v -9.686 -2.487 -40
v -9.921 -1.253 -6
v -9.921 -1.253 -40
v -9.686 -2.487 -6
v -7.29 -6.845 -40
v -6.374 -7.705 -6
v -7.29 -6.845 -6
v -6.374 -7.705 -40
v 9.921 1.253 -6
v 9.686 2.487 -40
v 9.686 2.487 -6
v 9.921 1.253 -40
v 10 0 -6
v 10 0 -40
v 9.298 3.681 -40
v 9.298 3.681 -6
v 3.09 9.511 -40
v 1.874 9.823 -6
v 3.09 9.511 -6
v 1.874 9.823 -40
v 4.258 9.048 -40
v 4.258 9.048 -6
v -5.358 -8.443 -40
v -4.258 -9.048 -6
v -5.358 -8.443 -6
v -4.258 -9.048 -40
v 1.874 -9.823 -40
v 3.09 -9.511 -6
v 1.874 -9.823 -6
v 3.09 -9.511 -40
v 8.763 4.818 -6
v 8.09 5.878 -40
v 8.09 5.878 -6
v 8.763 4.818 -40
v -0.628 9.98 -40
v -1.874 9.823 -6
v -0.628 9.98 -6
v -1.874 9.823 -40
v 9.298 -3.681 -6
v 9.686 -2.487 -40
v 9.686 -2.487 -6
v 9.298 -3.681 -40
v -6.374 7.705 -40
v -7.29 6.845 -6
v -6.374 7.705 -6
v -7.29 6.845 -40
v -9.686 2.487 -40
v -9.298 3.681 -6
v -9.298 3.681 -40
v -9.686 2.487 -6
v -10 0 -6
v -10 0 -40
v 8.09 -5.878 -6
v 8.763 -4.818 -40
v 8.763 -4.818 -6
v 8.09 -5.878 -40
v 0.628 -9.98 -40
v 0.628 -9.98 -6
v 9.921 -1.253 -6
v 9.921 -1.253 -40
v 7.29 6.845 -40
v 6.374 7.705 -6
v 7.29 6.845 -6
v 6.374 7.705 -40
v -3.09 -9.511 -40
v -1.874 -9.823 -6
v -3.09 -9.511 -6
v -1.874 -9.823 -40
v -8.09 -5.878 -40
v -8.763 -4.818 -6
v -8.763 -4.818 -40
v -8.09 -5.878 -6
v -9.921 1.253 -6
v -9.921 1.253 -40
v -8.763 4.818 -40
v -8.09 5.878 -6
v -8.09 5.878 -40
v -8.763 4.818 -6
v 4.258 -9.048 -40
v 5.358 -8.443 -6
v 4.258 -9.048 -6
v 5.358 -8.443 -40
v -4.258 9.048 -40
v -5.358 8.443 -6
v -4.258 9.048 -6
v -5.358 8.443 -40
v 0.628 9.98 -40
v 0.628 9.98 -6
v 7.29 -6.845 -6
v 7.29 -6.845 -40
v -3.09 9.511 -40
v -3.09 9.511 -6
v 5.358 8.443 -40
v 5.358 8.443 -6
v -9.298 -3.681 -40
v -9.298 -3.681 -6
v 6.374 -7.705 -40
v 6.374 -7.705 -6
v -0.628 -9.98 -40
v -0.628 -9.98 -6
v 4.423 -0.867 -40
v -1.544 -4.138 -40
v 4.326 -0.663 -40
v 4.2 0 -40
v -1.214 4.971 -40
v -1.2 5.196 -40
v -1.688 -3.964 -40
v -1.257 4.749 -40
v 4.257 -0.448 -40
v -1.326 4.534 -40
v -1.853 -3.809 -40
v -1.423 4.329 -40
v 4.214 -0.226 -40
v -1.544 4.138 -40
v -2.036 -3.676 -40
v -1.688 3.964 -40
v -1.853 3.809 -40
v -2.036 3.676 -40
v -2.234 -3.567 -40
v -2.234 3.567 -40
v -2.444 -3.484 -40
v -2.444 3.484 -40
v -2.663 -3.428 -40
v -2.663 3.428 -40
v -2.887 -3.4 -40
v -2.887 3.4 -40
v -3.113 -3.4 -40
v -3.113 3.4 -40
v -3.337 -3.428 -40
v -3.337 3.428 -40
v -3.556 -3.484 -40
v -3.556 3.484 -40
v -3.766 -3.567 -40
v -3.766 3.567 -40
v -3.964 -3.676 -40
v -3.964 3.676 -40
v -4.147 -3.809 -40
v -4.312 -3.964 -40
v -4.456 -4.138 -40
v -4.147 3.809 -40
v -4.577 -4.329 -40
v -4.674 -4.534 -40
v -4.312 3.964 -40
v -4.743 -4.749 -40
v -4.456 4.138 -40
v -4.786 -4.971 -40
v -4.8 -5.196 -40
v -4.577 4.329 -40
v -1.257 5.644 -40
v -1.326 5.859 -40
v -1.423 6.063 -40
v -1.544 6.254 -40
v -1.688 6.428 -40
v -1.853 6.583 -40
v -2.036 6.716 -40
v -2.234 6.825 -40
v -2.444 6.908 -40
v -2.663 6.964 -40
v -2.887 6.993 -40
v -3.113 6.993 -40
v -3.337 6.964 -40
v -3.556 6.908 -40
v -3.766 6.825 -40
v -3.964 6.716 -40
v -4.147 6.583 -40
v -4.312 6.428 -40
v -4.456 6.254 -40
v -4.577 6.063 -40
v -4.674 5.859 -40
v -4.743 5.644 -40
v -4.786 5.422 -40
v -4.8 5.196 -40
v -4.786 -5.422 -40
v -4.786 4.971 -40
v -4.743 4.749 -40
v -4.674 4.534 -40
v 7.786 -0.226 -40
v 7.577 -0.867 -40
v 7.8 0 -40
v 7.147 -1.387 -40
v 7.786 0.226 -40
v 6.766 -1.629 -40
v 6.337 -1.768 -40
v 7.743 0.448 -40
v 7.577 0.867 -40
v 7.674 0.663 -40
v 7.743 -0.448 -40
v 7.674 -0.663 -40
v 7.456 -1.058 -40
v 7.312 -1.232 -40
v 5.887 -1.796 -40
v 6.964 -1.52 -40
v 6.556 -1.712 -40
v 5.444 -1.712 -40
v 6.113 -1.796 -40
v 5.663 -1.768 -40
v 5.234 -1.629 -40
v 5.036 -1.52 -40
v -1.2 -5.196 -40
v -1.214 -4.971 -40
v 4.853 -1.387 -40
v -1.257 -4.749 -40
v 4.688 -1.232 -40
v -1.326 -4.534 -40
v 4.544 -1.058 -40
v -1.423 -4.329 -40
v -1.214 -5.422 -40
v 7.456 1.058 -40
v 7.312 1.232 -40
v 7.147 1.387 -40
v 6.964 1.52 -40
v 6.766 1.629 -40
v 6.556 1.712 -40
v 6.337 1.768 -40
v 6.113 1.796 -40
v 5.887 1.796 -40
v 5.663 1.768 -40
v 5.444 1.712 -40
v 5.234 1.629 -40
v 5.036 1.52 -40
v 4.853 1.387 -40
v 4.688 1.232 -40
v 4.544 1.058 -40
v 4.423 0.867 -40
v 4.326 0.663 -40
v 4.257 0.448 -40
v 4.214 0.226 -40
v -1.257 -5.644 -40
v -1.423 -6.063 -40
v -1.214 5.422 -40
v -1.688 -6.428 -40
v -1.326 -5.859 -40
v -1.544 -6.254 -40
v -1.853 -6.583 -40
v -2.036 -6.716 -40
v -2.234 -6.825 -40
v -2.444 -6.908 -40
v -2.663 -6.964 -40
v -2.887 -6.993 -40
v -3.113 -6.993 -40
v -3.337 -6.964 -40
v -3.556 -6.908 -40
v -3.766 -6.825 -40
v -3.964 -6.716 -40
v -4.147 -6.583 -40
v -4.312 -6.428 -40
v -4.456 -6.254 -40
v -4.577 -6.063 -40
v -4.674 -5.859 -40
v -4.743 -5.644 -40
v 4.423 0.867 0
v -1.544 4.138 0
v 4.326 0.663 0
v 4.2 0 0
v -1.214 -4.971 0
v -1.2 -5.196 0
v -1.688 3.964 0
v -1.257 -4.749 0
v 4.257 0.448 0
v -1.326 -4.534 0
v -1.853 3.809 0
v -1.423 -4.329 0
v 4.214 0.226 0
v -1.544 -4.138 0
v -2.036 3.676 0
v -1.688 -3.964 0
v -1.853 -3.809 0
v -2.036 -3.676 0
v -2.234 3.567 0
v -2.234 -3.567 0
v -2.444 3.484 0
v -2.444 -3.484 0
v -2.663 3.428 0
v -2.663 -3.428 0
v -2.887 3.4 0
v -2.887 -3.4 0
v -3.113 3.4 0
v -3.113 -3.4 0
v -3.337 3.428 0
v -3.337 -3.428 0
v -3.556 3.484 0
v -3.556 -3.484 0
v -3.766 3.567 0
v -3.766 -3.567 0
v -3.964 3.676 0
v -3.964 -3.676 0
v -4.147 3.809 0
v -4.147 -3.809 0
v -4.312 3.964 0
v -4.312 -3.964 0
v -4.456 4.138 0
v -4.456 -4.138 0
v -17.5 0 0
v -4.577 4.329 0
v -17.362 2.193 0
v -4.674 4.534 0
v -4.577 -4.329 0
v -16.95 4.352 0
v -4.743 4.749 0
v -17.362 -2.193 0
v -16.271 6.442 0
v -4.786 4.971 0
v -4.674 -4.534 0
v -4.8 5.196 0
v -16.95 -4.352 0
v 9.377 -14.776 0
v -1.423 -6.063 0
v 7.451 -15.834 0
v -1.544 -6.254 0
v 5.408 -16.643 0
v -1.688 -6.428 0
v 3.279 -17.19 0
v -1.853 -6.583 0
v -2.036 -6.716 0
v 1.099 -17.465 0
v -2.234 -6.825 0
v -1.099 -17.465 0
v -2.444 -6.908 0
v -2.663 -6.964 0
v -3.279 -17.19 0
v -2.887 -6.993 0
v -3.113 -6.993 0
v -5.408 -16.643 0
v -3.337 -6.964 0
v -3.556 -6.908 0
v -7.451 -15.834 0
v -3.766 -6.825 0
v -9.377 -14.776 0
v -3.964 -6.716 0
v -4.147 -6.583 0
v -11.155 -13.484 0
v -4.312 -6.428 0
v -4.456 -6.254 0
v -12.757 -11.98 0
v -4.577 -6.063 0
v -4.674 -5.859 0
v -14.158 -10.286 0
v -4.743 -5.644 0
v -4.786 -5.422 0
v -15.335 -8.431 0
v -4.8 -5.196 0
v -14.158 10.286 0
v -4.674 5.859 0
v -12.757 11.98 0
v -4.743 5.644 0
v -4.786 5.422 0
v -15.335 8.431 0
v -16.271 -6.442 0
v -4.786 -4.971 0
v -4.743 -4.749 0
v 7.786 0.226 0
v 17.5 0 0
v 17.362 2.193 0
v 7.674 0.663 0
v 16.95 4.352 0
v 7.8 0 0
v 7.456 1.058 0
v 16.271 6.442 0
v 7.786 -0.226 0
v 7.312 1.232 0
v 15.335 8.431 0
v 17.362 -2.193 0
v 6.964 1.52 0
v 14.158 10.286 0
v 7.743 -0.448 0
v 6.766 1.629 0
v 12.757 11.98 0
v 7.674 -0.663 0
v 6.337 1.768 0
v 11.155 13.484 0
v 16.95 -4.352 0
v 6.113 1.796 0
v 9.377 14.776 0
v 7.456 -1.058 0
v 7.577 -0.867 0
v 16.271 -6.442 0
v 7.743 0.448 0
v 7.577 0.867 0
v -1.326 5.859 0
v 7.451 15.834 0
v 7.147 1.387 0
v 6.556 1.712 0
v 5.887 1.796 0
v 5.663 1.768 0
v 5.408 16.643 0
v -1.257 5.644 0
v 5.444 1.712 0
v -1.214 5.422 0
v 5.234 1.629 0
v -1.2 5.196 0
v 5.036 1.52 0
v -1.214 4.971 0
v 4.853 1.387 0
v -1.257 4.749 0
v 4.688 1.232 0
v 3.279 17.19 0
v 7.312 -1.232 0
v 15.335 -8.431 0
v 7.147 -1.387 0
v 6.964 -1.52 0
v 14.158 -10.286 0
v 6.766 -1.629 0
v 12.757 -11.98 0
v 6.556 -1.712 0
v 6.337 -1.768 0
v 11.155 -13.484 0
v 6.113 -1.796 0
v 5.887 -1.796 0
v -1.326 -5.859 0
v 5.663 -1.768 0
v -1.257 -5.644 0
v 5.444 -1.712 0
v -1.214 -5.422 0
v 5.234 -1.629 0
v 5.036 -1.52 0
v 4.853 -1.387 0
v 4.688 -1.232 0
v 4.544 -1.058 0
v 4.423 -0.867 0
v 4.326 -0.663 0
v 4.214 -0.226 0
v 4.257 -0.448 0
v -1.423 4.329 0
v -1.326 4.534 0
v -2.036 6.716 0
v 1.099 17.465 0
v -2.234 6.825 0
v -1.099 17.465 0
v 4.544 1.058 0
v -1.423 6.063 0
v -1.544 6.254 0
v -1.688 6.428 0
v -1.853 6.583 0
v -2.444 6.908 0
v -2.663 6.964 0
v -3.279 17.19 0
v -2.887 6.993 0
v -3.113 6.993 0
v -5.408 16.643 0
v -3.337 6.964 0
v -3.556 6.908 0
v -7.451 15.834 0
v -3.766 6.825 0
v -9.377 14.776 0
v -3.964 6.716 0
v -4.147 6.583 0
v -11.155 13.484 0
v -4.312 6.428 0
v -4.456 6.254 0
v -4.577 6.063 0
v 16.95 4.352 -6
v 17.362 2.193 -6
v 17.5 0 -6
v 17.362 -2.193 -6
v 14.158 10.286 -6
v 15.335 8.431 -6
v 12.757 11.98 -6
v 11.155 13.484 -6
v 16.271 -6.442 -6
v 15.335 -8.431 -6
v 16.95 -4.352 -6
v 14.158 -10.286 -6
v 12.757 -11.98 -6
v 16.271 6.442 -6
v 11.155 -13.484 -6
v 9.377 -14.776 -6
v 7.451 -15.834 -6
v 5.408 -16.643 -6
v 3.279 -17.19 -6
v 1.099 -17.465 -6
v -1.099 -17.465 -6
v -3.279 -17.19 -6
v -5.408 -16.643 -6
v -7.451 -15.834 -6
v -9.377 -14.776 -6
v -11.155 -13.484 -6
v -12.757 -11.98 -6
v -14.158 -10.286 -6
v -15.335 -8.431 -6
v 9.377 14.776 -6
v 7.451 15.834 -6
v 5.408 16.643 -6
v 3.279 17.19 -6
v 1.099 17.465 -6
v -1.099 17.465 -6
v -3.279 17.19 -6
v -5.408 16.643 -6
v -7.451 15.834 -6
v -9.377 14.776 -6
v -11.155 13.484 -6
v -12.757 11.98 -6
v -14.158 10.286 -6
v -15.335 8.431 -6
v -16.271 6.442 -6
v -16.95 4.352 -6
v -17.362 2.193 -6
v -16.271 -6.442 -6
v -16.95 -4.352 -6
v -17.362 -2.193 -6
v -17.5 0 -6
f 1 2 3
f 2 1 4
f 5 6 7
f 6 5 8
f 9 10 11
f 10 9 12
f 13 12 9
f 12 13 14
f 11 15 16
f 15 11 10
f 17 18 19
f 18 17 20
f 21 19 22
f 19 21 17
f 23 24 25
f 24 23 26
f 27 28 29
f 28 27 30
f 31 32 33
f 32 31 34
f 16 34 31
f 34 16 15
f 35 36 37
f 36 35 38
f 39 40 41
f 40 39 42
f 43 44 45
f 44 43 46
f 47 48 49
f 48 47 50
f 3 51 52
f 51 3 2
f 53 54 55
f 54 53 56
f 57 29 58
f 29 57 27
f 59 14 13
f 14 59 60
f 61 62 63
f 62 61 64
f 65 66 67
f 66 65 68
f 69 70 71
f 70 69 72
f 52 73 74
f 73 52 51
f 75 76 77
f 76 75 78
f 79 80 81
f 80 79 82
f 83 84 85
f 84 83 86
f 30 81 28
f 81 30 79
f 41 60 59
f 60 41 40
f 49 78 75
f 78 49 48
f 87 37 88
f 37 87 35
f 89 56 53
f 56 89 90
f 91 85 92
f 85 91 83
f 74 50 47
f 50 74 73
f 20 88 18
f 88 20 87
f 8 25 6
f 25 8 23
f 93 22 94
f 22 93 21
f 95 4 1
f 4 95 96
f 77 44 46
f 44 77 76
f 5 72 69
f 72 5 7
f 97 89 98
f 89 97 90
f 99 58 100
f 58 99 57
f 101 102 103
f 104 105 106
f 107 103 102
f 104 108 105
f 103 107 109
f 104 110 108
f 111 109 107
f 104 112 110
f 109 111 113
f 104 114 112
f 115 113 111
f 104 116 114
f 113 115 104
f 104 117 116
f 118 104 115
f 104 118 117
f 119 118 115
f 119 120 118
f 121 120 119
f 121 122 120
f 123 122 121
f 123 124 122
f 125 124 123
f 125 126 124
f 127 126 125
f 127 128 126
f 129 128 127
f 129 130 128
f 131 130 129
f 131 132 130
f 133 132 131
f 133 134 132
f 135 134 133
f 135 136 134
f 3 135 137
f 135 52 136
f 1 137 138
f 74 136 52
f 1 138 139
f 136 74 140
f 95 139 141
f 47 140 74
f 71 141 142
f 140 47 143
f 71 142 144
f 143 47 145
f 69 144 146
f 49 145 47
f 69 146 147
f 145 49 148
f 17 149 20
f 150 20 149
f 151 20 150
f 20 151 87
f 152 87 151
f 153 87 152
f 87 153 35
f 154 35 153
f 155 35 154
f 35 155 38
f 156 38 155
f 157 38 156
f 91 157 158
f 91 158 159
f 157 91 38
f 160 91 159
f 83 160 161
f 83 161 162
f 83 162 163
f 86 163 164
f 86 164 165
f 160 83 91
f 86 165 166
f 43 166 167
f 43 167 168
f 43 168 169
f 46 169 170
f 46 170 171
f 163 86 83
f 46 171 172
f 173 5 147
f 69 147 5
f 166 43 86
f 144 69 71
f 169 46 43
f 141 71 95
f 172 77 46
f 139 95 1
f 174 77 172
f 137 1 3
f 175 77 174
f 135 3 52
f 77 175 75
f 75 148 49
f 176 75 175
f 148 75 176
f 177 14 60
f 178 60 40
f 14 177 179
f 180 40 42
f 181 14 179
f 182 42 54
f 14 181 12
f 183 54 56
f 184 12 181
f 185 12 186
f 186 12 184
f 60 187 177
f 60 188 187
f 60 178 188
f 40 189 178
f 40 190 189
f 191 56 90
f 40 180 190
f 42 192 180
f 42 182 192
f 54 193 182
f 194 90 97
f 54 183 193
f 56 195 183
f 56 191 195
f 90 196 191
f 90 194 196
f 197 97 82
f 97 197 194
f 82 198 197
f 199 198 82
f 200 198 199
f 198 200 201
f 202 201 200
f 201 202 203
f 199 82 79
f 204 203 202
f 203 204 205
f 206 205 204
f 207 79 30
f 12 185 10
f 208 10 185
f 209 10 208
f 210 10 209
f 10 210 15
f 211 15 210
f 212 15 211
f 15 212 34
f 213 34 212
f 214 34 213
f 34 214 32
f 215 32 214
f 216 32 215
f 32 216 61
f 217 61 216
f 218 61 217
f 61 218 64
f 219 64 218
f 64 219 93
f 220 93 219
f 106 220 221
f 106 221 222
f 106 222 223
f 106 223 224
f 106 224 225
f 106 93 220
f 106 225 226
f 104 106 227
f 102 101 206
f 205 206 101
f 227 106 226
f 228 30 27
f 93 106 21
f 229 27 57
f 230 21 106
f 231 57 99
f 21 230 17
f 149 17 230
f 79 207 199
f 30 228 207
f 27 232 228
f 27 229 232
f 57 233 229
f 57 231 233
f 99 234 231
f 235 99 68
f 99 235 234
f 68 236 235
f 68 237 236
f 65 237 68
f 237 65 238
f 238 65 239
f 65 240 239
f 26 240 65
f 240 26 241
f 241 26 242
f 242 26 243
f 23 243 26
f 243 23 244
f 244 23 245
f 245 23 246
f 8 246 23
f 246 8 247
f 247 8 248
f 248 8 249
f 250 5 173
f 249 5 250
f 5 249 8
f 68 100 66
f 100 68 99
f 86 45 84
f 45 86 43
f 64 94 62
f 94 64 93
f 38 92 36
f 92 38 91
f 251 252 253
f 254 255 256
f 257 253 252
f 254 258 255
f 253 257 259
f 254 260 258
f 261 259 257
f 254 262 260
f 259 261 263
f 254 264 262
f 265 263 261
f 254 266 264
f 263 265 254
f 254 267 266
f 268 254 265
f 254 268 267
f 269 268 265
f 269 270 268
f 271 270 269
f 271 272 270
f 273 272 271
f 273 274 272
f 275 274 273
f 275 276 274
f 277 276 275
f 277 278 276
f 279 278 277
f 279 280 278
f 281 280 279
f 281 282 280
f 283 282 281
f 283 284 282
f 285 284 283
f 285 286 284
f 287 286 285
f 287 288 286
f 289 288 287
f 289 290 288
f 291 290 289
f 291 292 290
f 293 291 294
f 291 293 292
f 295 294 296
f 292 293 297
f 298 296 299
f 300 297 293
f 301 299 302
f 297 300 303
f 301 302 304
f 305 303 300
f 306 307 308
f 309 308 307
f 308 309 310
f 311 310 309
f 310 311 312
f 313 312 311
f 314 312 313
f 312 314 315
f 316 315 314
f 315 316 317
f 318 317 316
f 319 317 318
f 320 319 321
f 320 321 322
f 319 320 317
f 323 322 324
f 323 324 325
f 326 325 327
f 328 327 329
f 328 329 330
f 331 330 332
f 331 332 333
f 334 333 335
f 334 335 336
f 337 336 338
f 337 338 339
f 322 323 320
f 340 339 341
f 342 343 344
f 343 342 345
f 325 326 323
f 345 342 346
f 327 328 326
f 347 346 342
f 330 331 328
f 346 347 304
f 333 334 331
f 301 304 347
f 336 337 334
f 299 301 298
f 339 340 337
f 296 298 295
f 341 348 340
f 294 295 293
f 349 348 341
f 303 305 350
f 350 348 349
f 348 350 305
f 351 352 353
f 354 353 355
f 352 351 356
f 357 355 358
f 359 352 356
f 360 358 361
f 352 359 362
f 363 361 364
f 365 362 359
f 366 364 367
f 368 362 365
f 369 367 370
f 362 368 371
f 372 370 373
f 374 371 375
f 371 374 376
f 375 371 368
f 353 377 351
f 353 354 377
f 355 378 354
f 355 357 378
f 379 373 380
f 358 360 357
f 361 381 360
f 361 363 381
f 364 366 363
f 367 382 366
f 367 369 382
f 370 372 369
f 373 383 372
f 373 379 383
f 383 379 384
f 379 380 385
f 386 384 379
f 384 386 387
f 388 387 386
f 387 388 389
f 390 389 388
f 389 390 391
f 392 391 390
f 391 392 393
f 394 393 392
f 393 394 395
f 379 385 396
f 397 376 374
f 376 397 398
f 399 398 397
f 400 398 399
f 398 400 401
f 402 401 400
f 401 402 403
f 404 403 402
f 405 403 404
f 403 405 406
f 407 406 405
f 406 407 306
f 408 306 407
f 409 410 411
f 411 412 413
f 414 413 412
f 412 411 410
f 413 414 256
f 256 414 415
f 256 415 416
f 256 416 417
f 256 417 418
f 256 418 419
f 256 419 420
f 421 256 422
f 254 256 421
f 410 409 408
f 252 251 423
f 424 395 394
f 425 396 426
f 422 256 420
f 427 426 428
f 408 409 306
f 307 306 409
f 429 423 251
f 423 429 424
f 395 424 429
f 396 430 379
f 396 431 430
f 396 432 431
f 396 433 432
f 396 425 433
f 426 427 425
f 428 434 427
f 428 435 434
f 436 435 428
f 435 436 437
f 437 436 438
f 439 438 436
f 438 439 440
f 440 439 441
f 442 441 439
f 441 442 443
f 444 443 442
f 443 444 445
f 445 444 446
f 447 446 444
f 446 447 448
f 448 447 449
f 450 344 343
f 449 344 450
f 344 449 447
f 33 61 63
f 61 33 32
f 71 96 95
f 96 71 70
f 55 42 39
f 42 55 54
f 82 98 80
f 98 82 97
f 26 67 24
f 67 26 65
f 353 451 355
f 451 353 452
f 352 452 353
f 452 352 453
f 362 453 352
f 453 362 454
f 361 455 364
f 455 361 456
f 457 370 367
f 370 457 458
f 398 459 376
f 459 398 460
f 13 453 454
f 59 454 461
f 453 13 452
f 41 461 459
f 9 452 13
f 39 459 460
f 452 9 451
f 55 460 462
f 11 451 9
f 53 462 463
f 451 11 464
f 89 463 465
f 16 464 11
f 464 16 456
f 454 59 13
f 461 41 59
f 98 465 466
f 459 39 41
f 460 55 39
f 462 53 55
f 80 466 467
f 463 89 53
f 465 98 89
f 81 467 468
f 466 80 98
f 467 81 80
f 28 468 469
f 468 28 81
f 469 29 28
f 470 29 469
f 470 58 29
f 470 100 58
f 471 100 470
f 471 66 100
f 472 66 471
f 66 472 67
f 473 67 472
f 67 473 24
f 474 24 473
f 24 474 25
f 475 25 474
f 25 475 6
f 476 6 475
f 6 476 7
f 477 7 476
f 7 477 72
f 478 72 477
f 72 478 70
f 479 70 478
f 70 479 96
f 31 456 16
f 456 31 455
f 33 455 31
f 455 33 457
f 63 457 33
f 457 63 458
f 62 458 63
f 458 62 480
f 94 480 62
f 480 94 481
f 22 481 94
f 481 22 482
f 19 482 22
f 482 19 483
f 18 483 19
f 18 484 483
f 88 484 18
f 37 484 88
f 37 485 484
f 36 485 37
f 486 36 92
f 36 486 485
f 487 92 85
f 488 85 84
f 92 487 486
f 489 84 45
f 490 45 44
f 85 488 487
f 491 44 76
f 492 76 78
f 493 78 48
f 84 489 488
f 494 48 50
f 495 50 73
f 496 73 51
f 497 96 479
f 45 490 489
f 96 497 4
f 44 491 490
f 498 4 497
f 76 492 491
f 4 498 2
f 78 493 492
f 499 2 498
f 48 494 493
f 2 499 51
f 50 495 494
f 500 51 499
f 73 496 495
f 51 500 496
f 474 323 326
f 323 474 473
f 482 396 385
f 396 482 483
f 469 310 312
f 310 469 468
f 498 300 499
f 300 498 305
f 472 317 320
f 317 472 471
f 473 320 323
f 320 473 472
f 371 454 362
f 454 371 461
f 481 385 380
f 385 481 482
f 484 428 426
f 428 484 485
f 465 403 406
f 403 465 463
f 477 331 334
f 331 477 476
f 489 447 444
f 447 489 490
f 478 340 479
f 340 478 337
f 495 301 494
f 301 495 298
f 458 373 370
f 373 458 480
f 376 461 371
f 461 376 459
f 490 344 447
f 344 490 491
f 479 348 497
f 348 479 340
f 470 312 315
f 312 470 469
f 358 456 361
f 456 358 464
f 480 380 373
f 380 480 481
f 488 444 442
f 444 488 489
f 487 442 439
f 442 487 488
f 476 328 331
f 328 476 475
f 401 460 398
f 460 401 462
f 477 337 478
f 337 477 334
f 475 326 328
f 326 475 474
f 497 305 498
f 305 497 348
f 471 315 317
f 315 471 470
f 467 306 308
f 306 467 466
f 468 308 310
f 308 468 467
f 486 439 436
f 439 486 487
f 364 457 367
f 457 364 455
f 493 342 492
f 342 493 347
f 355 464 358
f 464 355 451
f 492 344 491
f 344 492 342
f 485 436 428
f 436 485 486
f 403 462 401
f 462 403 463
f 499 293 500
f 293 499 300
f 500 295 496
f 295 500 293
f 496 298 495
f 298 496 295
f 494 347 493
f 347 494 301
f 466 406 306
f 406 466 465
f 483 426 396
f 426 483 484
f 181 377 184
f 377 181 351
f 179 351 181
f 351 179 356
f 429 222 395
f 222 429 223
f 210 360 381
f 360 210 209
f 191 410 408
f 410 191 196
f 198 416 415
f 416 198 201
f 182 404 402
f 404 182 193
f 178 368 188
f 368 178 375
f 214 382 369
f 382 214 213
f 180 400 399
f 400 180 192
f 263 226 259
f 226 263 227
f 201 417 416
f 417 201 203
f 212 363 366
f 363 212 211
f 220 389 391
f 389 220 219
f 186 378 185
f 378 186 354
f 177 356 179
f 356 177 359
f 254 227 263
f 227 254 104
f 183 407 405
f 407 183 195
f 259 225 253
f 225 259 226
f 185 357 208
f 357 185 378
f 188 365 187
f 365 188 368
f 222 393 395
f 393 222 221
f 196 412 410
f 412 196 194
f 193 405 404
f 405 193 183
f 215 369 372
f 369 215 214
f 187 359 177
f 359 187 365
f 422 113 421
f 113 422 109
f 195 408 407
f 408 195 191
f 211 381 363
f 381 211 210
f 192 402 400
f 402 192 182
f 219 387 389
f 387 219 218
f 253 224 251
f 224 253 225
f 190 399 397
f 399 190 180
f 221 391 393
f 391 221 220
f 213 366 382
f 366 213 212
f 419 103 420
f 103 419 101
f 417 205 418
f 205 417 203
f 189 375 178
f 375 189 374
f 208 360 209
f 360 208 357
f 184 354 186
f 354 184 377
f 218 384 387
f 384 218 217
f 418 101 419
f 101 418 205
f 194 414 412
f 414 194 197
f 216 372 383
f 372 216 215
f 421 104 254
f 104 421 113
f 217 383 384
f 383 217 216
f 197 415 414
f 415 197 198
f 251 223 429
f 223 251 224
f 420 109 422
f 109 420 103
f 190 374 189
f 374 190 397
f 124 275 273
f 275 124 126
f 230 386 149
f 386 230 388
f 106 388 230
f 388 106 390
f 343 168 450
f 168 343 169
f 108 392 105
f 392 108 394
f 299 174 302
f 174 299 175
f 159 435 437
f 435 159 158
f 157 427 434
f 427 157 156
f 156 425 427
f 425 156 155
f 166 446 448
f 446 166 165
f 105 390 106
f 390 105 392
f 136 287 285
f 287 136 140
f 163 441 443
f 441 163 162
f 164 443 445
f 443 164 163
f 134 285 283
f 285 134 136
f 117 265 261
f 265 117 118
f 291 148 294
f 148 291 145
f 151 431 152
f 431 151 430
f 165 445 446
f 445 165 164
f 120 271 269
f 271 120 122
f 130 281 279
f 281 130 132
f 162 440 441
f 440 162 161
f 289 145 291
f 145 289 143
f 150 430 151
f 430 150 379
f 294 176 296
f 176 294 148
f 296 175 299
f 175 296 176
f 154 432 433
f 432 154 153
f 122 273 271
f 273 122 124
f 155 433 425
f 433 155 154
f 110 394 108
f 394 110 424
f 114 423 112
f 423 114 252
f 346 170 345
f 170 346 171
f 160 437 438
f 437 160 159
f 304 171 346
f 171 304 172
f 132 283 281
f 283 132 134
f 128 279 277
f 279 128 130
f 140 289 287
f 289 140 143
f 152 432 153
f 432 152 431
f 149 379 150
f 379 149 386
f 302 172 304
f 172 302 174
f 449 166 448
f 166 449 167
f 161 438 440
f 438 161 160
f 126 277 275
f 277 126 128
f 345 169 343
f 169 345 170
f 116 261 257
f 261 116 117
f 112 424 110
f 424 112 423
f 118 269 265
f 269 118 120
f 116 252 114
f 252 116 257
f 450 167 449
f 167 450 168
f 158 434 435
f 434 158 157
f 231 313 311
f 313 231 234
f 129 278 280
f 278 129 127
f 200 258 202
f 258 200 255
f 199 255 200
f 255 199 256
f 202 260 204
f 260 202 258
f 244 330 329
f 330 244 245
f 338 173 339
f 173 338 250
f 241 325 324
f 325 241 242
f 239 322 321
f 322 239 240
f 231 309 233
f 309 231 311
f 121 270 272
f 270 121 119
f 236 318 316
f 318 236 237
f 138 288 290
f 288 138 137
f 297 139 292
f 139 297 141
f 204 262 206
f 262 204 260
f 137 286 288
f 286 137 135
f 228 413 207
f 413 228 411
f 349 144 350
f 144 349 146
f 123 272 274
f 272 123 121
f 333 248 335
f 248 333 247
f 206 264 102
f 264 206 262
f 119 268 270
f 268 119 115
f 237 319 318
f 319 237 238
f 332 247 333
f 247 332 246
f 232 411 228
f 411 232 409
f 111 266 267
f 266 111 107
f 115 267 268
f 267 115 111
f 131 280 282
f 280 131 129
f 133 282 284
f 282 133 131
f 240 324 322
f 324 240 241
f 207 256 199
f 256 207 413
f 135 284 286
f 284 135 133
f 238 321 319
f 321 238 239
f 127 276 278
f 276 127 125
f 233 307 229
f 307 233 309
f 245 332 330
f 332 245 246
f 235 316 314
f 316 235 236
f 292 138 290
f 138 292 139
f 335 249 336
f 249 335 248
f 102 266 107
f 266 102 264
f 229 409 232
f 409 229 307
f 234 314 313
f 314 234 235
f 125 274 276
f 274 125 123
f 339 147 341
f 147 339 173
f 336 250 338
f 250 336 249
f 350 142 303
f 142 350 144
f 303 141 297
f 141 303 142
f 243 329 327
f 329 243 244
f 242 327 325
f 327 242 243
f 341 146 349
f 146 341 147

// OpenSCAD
$fn = 50;


difference() {
	union() {
		translate(v = [0, 0, -40.0000000000]) {
			cylinder(h = 40, r = 10.0000000000);
		}
		translate(v = [0, 0, -6.0000000000]) {
			cylinder(h = 6, r = 17.5000000000);
		}
	}
	union() {
		#translate(v = [6.0000000000, 0.0000000000, -40]) {
			cylinder(h = 40, r = 1.8000000000);
		}
		#translate(v = [-3.0000000000, 5.1961524227, -40]) {
			cylinder(h = 40, r = 1.8000000000);
		}
		#translate(v = [-3.0000000000, -5.1961524227, -40]) {
			cylinder(h = 40, r = 1.8000000000);
		}
	}
}
